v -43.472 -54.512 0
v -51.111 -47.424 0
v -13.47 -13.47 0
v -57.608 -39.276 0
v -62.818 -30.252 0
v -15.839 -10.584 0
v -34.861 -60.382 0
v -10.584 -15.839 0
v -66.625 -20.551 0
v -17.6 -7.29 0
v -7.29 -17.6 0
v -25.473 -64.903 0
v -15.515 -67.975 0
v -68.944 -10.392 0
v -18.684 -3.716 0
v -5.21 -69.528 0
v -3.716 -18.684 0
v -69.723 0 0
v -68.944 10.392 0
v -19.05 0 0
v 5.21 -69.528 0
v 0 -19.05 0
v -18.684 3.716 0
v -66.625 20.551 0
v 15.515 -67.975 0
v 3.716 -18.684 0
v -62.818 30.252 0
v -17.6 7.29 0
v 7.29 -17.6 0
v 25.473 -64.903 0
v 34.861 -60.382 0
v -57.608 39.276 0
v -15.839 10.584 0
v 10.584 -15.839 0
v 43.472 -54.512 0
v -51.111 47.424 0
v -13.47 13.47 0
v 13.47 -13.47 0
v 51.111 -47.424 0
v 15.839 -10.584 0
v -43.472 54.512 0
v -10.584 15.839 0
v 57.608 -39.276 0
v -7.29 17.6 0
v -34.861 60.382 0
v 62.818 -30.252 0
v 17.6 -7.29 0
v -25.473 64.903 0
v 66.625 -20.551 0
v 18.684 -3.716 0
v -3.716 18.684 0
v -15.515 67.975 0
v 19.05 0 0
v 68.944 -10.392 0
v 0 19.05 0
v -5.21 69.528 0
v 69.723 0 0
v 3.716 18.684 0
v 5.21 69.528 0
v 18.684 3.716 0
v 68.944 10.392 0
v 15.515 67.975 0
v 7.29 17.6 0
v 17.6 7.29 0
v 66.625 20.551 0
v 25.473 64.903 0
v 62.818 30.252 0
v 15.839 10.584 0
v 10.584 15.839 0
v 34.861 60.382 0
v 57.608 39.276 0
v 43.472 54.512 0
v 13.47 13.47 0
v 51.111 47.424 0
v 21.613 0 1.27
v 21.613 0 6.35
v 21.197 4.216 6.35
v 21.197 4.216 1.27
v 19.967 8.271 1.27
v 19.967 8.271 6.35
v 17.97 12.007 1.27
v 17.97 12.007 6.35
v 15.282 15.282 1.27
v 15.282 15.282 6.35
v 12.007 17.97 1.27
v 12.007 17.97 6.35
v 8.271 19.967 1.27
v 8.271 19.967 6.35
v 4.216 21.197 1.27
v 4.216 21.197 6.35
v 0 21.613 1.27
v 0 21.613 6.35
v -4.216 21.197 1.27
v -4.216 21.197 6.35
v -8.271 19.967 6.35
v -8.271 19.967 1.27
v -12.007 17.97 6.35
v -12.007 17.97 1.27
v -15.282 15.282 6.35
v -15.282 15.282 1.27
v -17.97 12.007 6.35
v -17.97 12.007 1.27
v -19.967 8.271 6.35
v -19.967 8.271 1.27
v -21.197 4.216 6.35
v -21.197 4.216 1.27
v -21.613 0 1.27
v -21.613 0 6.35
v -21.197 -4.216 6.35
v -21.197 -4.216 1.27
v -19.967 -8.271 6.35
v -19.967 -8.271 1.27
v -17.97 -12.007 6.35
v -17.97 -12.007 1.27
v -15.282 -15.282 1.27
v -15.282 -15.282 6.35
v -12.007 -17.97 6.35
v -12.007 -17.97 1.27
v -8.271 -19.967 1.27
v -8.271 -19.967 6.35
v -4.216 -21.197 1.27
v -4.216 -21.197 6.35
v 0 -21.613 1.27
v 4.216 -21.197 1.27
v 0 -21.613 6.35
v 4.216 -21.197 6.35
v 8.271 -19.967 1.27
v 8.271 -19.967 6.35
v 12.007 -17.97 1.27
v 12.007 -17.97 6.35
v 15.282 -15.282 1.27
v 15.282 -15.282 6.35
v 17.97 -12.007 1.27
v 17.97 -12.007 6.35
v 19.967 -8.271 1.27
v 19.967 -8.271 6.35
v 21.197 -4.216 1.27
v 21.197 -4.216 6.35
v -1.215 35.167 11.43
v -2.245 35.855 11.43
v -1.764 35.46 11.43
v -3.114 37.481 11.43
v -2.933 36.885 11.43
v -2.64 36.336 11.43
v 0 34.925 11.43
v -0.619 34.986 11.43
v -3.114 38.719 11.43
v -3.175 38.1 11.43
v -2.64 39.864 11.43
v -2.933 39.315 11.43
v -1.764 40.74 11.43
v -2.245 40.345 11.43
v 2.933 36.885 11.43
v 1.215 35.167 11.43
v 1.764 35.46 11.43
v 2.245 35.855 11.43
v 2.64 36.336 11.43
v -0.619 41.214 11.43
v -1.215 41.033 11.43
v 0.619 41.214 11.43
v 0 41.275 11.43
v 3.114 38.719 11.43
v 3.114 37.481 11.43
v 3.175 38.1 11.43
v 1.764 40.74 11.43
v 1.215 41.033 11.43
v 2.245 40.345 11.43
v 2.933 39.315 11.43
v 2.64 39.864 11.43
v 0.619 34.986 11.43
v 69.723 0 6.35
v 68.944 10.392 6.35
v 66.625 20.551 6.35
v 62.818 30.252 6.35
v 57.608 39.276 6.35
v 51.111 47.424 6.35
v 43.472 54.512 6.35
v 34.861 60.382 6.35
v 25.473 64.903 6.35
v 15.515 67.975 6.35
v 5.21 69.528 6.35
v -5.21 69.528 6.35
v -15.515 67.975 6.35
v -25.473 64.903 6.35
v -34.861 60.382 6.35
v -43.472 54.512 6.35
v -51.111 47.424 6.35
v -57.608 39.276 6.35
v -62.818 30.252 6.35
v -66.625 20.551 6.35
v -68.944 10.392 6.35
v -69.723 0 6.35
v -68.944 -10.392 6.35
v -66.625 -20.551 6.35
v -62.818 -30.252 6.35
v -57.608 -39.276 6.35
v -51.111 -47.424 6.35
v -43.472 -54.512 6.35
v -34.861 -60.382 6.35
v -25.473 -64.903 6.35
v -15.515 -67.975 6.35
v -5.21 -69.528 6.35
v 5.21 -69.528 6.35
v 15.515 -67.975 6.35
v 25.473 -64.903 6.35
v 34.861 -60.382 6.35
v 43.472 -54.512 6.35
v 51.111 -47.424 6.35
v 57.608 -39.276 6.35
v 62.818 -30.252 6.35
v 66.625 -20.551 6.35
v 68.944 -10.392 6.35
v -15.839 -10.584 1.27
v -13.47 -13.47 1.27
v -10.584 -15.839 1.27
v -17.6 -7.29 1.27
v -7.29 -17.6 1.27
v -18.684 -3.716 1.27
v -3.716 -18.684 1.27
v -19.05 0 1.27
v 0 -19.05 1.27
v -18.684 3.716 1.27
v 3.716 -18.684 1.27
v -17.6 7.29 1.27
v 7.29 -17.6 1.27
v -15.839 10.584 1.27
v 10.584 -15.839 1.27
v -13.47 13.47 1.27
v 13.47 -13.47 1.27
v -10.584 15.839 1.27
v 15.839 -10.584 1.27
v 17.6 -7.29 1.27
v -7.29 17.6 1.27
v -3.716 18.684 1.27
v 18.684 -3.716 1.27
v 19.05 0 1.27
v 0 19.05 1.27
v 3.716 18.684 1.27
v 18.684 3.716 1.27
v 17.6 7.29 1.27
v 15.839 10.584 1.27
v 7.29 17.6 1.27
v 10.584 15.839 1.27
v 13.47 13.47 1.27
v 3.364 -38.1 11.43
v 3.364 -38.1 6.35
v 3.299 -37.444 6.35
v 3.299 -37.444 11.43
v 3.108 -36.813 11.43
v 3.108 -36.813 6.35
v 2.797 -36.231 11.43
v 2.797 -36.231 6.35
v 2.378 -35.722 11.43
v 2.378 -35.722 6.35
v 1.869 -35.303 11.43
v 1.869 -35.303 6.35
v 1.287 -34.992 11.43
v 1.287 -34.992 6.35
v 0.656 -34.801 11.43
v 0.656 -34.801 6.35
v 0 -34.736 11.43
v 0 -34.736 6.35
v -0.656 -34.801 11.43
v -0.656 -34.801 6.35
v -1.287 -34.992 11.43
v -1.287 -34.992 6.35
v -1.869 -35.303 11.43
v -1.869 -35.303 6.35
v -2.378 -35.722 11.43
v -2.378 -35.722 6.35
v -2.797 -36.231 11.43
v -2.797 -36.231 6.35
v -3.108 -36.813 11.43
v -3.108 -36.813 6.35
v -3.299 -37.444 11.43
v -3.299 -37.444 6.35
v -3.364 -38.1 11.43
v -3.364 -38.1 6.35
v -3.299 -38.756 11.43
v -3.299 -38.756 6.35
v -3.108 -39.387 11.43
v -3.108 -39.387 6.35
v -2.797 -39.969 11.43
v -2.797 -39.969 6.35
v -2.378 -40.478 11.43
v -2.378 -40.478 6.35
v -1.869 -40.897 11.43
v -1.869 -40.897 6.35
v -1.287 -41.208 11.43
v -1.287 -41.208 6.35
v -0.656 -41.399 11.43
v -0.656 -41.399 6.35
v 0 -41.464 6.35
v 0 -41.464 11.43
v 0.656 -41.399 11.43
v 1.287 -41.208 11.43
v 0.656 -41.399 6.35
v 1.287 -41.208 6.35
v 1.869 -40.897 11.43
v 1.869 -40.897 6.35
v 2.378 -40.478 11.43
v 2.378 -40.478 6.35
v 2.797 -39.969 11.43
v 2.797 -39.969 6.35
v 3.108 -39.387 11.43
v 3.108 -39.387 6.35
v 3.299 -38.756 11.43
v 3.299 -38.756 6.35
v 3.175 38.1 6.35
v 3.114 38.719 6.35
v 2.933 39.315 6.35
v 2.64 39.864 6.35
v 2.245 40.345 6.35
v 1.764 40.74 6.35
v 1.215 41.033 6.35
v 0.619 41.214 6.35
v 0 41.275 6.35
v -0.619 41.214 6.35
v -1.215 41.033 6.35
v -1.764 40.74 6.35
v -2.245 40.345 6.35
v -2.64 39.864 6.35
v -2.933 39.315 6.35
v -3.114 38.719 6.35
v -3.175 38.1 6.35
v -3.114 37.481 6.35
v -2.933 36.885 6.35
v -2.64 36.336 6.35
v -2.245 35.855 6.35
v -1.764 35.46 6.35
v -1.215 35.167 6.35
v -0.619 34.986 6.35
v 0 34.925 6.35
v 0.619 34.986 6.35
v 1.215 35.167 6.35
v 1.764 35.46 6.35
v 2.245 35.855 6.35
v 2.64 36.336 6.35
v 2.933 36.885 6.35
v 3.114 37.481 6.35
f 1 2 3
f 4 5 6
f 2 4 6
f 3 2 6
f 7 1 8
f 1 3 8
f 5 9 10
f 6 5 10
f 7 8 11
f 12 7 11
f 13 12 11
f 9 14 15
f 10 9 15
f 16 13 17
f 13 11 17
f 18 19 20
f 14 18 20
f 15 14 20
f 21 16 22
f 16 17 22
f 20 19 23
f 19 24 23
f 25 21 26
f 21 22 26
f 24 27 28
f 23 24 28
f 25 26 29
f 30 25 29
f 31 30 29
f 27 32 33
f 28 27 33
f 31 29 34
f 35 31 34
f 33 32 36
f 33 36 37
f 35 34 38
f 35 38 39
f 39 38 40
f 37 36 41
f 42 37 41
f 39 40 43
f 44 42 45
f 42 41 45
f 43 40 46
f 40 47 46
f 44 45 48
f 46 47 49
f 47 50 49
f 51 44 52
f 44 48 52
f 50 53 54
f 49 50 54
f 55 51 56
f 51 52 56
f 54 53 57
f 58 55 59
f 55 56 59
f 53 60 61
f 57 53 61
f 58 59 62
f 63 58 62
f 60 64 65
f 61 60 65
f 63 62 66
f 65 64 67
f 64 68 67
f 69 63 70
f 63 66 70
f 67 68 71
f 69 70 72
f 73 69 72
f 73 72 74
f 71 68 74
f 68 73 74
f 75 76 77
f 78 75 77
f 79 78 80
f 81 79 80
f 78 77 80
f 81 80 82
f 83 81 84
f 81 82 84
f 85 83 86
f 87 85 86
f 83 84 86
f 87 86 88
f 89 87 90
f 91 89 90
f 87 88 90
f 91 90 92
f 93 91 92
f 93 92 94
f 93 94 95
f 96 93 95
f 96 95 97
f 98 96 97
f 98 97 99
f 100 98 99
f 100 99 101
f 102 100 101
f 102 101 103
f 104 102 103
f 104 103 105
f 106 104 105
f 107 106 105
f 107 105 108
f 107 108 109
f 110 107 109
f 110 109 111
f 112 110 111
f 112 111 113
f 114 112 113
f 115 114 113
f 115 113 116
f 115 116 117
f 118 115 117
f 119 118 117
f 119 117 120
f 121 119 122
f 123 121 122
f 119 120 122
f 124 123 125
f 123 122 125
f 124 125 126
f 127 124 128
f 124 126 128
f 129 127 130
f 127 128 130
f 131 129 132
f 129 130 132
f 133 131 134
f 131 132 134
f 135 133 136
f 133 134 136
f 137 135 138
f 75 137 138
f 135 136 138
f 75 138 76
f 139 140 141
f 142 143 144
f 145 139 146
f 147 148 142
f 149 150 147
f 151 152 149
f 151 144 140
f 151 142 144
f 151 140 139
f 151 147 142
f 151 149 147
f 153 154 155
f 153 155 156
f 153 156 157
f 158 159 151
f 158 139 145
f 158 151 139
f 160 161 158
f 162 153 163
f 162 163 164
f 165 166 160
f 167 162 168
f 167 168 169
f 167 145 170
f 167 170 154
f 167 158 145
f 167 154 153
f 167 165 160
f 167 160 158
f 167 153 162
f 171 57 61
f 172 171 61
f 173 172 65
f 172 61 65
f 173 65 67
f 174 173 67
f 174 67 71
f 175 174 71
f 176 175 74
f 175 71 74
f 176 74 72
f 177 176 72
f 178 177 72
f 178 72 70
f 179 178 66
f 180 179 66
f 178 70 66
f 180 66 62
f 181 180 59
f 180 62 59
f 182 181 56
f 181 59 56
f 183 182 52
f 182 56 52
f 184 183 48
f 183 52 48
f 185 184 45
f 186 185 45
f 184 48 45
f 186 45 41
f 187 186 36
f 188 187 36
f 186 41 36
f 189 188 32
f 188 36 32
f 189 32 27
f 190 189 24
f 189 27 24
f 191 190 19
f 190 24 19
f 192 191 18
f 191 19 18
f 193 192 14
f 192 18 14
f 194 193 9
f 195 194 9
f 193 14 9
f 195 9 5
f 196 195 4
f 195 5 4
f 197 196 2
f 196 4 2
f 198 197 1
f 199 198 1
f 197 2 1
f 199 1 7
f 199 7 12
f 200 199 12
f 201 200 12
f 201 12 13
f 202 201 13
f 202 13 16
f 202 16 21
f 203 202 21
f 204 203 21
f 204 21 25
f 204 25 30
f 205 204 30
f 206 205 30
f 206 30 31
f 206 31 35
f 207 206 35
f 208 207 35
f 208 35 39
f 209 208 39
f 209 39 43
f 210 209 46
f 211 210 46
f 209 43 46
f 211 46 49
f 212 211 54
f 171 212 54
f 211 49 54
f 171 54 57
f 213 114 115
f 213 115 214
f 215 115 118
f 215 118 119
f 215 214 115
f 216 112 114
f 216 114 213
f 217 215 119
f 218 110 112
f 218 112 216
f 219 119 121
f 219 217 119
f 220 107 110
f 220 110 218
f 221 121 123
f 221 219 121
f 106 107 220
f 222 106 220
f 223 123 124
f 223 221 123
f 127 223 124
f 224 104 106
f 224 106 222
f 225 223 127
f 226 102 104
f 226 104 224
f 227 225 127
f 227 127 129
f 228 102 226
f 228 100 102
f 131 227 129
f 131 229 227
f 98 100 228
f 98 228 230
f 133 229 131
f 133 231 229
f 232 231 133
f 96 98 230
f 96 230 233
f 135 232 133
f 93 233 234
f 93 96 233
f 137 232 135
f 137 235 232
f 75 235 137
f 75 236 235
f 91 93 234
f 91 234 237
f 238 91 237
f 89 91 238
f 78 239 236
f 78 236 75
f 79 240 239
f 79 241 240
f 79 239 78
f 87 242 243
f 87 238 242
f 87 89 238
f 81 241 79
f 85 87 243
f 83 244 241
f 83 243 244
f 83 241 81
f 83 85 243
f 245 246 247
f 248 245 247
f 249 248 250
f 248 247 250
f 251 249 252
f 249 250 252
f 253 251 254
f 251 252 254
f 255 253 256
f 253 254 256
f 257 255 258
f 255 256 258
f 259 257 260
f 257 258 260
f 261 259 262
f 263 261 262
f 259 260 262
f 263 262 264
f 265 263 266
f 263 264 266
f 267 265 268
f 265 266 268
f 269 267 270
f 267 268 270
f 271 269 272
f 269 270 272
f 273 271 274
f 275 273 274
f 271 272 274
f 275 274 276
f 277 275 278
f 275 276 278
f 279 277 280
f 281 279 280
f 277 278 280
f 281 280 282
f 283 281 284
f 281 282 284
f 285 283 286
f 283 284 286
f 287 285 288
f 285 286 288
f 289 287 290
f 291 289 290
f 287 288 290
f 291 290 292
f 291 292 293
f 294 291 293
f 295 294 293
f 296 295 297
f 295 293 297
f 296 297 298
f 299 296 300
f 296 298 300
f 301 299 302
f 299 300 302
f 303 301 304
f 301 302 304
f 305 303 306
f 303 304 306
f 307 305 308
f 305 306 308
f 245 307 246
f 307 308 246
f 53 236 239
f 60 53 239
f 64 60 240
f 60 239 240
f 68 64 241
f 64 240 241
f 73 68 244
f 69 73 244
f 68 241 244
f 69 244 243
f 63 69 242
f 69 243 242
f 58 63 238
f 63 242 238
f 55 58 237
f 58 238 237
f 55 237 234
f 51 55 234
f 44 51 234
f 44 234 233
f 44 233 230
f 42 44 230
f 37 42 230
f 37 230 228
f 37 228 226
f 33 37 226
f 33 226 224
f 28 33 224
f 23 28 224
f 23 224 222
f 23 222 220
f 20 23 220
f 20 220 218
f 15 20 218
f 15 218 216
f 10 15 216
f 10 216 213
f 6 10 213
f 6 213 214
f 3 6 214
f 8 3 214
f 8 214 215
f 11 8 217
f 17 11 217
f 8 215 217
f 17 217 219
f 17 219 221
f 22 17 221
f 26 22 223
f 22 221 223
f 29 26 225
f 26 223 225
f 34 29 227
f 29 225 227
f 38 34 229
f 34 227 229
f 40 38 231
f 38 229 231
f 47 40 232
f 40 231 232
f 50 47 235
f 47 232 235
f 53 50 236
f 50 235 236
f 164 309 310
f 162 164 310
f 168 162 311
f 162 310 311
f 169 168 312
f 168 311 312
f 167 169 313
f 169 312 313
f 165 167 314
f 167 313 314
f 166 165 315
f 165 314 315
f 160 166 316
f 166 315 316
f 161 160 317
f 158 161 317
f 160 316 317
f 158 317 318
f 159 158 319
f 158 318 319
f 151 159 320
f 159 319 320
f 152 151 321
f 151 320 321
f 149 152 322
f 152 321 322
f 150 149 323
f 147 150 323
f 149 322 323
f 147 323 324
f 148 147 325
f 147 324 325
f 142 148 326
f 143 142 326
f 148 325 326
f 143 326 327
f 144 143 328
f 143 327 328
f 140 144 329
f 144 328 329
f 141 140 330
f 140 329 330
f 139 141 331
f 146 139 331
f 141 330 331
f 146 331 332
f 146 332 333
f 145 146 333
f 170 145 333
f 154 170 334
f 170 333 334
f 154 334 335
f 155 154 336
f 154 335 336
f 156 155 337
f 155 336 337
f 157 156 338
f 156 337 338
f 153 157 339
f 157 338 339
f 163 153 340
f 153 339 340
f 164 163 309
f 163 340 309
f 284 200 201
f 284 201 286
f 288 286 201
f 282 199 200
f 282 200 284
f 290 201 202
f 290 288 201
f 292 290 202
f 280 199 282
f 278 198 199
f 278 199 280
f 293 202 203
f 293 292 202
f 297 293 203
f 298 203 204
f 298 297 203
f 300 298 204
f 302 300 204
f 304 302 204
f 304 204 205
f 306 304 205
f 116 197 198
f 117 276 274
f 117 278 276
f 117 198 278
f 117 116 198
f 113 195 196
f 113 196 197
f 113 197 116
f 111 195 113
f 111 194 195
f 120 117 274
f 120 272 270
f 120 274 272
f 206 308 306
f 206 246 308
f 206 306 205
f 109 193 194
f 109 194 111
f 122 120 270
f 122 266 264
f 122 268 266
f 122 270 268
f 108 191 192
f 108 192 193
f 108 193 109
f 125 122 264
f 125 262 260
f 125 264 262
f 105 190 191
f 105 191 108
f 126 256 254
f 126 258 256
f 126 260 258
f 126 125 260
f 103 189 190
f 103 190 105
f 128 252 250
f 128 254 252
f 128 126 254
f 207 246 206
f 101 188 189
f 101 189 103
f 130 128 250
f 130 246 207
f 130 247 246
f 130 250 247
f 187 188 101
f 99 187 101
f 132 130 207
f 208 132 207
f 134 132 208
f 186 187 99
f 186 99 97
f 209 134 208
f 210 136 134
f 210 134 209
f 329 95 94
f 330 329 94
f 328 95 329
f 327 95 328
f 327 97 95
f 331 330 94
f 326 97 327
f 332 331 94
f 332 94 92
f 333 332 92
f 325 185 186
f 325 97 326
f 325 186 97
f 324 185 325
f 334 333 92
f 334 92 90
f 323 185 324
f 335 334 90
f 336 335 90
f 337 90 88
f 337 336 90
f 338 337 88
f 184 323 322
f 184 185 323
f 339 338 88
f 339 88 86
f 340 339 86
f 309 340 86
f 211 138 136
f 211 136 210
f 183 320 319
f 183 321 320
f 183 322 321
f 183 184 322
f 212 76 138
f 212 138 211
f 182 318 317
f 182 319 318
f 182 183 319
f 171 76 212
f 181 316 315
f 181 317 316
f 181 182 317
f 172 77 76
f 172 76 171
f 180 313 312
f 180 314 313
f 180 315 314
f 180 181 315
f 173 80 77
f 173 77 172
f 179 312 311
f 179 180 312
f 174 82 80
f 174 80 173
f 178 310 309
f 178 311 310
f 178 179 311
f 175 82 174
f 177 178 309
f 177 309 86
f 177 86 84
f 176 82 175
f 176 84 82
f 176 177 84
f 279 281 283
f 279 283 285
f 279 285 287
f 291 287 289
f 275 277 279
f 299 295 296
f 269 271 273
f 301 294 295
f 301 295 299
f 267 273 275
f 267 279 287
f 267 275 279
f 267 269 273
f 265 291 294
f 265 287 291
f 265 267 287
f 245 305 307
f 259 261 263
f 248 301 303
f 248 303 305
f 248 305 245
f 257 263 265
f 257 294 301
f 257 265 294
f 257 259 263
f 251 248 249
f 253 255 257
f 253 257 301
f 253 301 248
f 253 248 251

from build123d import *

# Parameters (mm, degrees)
F0_R     = 69.723
F1_DEPTH = 6.35
F2_R     = 19.05
F3_DEPTH = 25.4
F4_R     = 21.6125531476
F5_DEPTH = 3.302
F6_DEPTH = 1.778
F7_R     = 3.175
F7_R_2   = 3.3636325345
F8_DEPTH = 5.08


with BuildPart() as f1:
    # F0 (on Top) → F1 (new body)
    with BuildSketch(Plane.XY):
        Circle(F0_R)
    extrude(amount=F1_DEPTH)

    # F2 (on face) → F3 (cut)
    with BuildSketch(Plane.XY.offset(6.35)):
        Circle(F2_R)
    extrude(amount=-F3_DEPTH, mode=Mode.SUBTRACT)

    # F4 (on face) → F5 (cut)
    with BuildSketch(Plane.XY.offset(6.35)):
        Circle(F4_R)
    extrude(amount=-F5_DEPTH, mode=Mode.SUBTRACT)

    # F6 (cut): a face of the model
    f6_faces = [f1.faces().sort_by_distance(p)[0] for p in [
        (-21.001257832, 0, 3.048),
    ]]
    extrude(f6_faces, amount=-F6_DEPTH, mode=Mode.SUBTRACT)

    # F7 (on face) → F8 (join)
    with BuildSketch(Plane.XY.offset(6.35)):
        with Locations((0, 38.1)):
            Circle(F7_R)
        with Locations((0, -38.1)):
            Circle(F7_R_2)
    extrude(amount=F8_DEPTH)


solid = f1.part
